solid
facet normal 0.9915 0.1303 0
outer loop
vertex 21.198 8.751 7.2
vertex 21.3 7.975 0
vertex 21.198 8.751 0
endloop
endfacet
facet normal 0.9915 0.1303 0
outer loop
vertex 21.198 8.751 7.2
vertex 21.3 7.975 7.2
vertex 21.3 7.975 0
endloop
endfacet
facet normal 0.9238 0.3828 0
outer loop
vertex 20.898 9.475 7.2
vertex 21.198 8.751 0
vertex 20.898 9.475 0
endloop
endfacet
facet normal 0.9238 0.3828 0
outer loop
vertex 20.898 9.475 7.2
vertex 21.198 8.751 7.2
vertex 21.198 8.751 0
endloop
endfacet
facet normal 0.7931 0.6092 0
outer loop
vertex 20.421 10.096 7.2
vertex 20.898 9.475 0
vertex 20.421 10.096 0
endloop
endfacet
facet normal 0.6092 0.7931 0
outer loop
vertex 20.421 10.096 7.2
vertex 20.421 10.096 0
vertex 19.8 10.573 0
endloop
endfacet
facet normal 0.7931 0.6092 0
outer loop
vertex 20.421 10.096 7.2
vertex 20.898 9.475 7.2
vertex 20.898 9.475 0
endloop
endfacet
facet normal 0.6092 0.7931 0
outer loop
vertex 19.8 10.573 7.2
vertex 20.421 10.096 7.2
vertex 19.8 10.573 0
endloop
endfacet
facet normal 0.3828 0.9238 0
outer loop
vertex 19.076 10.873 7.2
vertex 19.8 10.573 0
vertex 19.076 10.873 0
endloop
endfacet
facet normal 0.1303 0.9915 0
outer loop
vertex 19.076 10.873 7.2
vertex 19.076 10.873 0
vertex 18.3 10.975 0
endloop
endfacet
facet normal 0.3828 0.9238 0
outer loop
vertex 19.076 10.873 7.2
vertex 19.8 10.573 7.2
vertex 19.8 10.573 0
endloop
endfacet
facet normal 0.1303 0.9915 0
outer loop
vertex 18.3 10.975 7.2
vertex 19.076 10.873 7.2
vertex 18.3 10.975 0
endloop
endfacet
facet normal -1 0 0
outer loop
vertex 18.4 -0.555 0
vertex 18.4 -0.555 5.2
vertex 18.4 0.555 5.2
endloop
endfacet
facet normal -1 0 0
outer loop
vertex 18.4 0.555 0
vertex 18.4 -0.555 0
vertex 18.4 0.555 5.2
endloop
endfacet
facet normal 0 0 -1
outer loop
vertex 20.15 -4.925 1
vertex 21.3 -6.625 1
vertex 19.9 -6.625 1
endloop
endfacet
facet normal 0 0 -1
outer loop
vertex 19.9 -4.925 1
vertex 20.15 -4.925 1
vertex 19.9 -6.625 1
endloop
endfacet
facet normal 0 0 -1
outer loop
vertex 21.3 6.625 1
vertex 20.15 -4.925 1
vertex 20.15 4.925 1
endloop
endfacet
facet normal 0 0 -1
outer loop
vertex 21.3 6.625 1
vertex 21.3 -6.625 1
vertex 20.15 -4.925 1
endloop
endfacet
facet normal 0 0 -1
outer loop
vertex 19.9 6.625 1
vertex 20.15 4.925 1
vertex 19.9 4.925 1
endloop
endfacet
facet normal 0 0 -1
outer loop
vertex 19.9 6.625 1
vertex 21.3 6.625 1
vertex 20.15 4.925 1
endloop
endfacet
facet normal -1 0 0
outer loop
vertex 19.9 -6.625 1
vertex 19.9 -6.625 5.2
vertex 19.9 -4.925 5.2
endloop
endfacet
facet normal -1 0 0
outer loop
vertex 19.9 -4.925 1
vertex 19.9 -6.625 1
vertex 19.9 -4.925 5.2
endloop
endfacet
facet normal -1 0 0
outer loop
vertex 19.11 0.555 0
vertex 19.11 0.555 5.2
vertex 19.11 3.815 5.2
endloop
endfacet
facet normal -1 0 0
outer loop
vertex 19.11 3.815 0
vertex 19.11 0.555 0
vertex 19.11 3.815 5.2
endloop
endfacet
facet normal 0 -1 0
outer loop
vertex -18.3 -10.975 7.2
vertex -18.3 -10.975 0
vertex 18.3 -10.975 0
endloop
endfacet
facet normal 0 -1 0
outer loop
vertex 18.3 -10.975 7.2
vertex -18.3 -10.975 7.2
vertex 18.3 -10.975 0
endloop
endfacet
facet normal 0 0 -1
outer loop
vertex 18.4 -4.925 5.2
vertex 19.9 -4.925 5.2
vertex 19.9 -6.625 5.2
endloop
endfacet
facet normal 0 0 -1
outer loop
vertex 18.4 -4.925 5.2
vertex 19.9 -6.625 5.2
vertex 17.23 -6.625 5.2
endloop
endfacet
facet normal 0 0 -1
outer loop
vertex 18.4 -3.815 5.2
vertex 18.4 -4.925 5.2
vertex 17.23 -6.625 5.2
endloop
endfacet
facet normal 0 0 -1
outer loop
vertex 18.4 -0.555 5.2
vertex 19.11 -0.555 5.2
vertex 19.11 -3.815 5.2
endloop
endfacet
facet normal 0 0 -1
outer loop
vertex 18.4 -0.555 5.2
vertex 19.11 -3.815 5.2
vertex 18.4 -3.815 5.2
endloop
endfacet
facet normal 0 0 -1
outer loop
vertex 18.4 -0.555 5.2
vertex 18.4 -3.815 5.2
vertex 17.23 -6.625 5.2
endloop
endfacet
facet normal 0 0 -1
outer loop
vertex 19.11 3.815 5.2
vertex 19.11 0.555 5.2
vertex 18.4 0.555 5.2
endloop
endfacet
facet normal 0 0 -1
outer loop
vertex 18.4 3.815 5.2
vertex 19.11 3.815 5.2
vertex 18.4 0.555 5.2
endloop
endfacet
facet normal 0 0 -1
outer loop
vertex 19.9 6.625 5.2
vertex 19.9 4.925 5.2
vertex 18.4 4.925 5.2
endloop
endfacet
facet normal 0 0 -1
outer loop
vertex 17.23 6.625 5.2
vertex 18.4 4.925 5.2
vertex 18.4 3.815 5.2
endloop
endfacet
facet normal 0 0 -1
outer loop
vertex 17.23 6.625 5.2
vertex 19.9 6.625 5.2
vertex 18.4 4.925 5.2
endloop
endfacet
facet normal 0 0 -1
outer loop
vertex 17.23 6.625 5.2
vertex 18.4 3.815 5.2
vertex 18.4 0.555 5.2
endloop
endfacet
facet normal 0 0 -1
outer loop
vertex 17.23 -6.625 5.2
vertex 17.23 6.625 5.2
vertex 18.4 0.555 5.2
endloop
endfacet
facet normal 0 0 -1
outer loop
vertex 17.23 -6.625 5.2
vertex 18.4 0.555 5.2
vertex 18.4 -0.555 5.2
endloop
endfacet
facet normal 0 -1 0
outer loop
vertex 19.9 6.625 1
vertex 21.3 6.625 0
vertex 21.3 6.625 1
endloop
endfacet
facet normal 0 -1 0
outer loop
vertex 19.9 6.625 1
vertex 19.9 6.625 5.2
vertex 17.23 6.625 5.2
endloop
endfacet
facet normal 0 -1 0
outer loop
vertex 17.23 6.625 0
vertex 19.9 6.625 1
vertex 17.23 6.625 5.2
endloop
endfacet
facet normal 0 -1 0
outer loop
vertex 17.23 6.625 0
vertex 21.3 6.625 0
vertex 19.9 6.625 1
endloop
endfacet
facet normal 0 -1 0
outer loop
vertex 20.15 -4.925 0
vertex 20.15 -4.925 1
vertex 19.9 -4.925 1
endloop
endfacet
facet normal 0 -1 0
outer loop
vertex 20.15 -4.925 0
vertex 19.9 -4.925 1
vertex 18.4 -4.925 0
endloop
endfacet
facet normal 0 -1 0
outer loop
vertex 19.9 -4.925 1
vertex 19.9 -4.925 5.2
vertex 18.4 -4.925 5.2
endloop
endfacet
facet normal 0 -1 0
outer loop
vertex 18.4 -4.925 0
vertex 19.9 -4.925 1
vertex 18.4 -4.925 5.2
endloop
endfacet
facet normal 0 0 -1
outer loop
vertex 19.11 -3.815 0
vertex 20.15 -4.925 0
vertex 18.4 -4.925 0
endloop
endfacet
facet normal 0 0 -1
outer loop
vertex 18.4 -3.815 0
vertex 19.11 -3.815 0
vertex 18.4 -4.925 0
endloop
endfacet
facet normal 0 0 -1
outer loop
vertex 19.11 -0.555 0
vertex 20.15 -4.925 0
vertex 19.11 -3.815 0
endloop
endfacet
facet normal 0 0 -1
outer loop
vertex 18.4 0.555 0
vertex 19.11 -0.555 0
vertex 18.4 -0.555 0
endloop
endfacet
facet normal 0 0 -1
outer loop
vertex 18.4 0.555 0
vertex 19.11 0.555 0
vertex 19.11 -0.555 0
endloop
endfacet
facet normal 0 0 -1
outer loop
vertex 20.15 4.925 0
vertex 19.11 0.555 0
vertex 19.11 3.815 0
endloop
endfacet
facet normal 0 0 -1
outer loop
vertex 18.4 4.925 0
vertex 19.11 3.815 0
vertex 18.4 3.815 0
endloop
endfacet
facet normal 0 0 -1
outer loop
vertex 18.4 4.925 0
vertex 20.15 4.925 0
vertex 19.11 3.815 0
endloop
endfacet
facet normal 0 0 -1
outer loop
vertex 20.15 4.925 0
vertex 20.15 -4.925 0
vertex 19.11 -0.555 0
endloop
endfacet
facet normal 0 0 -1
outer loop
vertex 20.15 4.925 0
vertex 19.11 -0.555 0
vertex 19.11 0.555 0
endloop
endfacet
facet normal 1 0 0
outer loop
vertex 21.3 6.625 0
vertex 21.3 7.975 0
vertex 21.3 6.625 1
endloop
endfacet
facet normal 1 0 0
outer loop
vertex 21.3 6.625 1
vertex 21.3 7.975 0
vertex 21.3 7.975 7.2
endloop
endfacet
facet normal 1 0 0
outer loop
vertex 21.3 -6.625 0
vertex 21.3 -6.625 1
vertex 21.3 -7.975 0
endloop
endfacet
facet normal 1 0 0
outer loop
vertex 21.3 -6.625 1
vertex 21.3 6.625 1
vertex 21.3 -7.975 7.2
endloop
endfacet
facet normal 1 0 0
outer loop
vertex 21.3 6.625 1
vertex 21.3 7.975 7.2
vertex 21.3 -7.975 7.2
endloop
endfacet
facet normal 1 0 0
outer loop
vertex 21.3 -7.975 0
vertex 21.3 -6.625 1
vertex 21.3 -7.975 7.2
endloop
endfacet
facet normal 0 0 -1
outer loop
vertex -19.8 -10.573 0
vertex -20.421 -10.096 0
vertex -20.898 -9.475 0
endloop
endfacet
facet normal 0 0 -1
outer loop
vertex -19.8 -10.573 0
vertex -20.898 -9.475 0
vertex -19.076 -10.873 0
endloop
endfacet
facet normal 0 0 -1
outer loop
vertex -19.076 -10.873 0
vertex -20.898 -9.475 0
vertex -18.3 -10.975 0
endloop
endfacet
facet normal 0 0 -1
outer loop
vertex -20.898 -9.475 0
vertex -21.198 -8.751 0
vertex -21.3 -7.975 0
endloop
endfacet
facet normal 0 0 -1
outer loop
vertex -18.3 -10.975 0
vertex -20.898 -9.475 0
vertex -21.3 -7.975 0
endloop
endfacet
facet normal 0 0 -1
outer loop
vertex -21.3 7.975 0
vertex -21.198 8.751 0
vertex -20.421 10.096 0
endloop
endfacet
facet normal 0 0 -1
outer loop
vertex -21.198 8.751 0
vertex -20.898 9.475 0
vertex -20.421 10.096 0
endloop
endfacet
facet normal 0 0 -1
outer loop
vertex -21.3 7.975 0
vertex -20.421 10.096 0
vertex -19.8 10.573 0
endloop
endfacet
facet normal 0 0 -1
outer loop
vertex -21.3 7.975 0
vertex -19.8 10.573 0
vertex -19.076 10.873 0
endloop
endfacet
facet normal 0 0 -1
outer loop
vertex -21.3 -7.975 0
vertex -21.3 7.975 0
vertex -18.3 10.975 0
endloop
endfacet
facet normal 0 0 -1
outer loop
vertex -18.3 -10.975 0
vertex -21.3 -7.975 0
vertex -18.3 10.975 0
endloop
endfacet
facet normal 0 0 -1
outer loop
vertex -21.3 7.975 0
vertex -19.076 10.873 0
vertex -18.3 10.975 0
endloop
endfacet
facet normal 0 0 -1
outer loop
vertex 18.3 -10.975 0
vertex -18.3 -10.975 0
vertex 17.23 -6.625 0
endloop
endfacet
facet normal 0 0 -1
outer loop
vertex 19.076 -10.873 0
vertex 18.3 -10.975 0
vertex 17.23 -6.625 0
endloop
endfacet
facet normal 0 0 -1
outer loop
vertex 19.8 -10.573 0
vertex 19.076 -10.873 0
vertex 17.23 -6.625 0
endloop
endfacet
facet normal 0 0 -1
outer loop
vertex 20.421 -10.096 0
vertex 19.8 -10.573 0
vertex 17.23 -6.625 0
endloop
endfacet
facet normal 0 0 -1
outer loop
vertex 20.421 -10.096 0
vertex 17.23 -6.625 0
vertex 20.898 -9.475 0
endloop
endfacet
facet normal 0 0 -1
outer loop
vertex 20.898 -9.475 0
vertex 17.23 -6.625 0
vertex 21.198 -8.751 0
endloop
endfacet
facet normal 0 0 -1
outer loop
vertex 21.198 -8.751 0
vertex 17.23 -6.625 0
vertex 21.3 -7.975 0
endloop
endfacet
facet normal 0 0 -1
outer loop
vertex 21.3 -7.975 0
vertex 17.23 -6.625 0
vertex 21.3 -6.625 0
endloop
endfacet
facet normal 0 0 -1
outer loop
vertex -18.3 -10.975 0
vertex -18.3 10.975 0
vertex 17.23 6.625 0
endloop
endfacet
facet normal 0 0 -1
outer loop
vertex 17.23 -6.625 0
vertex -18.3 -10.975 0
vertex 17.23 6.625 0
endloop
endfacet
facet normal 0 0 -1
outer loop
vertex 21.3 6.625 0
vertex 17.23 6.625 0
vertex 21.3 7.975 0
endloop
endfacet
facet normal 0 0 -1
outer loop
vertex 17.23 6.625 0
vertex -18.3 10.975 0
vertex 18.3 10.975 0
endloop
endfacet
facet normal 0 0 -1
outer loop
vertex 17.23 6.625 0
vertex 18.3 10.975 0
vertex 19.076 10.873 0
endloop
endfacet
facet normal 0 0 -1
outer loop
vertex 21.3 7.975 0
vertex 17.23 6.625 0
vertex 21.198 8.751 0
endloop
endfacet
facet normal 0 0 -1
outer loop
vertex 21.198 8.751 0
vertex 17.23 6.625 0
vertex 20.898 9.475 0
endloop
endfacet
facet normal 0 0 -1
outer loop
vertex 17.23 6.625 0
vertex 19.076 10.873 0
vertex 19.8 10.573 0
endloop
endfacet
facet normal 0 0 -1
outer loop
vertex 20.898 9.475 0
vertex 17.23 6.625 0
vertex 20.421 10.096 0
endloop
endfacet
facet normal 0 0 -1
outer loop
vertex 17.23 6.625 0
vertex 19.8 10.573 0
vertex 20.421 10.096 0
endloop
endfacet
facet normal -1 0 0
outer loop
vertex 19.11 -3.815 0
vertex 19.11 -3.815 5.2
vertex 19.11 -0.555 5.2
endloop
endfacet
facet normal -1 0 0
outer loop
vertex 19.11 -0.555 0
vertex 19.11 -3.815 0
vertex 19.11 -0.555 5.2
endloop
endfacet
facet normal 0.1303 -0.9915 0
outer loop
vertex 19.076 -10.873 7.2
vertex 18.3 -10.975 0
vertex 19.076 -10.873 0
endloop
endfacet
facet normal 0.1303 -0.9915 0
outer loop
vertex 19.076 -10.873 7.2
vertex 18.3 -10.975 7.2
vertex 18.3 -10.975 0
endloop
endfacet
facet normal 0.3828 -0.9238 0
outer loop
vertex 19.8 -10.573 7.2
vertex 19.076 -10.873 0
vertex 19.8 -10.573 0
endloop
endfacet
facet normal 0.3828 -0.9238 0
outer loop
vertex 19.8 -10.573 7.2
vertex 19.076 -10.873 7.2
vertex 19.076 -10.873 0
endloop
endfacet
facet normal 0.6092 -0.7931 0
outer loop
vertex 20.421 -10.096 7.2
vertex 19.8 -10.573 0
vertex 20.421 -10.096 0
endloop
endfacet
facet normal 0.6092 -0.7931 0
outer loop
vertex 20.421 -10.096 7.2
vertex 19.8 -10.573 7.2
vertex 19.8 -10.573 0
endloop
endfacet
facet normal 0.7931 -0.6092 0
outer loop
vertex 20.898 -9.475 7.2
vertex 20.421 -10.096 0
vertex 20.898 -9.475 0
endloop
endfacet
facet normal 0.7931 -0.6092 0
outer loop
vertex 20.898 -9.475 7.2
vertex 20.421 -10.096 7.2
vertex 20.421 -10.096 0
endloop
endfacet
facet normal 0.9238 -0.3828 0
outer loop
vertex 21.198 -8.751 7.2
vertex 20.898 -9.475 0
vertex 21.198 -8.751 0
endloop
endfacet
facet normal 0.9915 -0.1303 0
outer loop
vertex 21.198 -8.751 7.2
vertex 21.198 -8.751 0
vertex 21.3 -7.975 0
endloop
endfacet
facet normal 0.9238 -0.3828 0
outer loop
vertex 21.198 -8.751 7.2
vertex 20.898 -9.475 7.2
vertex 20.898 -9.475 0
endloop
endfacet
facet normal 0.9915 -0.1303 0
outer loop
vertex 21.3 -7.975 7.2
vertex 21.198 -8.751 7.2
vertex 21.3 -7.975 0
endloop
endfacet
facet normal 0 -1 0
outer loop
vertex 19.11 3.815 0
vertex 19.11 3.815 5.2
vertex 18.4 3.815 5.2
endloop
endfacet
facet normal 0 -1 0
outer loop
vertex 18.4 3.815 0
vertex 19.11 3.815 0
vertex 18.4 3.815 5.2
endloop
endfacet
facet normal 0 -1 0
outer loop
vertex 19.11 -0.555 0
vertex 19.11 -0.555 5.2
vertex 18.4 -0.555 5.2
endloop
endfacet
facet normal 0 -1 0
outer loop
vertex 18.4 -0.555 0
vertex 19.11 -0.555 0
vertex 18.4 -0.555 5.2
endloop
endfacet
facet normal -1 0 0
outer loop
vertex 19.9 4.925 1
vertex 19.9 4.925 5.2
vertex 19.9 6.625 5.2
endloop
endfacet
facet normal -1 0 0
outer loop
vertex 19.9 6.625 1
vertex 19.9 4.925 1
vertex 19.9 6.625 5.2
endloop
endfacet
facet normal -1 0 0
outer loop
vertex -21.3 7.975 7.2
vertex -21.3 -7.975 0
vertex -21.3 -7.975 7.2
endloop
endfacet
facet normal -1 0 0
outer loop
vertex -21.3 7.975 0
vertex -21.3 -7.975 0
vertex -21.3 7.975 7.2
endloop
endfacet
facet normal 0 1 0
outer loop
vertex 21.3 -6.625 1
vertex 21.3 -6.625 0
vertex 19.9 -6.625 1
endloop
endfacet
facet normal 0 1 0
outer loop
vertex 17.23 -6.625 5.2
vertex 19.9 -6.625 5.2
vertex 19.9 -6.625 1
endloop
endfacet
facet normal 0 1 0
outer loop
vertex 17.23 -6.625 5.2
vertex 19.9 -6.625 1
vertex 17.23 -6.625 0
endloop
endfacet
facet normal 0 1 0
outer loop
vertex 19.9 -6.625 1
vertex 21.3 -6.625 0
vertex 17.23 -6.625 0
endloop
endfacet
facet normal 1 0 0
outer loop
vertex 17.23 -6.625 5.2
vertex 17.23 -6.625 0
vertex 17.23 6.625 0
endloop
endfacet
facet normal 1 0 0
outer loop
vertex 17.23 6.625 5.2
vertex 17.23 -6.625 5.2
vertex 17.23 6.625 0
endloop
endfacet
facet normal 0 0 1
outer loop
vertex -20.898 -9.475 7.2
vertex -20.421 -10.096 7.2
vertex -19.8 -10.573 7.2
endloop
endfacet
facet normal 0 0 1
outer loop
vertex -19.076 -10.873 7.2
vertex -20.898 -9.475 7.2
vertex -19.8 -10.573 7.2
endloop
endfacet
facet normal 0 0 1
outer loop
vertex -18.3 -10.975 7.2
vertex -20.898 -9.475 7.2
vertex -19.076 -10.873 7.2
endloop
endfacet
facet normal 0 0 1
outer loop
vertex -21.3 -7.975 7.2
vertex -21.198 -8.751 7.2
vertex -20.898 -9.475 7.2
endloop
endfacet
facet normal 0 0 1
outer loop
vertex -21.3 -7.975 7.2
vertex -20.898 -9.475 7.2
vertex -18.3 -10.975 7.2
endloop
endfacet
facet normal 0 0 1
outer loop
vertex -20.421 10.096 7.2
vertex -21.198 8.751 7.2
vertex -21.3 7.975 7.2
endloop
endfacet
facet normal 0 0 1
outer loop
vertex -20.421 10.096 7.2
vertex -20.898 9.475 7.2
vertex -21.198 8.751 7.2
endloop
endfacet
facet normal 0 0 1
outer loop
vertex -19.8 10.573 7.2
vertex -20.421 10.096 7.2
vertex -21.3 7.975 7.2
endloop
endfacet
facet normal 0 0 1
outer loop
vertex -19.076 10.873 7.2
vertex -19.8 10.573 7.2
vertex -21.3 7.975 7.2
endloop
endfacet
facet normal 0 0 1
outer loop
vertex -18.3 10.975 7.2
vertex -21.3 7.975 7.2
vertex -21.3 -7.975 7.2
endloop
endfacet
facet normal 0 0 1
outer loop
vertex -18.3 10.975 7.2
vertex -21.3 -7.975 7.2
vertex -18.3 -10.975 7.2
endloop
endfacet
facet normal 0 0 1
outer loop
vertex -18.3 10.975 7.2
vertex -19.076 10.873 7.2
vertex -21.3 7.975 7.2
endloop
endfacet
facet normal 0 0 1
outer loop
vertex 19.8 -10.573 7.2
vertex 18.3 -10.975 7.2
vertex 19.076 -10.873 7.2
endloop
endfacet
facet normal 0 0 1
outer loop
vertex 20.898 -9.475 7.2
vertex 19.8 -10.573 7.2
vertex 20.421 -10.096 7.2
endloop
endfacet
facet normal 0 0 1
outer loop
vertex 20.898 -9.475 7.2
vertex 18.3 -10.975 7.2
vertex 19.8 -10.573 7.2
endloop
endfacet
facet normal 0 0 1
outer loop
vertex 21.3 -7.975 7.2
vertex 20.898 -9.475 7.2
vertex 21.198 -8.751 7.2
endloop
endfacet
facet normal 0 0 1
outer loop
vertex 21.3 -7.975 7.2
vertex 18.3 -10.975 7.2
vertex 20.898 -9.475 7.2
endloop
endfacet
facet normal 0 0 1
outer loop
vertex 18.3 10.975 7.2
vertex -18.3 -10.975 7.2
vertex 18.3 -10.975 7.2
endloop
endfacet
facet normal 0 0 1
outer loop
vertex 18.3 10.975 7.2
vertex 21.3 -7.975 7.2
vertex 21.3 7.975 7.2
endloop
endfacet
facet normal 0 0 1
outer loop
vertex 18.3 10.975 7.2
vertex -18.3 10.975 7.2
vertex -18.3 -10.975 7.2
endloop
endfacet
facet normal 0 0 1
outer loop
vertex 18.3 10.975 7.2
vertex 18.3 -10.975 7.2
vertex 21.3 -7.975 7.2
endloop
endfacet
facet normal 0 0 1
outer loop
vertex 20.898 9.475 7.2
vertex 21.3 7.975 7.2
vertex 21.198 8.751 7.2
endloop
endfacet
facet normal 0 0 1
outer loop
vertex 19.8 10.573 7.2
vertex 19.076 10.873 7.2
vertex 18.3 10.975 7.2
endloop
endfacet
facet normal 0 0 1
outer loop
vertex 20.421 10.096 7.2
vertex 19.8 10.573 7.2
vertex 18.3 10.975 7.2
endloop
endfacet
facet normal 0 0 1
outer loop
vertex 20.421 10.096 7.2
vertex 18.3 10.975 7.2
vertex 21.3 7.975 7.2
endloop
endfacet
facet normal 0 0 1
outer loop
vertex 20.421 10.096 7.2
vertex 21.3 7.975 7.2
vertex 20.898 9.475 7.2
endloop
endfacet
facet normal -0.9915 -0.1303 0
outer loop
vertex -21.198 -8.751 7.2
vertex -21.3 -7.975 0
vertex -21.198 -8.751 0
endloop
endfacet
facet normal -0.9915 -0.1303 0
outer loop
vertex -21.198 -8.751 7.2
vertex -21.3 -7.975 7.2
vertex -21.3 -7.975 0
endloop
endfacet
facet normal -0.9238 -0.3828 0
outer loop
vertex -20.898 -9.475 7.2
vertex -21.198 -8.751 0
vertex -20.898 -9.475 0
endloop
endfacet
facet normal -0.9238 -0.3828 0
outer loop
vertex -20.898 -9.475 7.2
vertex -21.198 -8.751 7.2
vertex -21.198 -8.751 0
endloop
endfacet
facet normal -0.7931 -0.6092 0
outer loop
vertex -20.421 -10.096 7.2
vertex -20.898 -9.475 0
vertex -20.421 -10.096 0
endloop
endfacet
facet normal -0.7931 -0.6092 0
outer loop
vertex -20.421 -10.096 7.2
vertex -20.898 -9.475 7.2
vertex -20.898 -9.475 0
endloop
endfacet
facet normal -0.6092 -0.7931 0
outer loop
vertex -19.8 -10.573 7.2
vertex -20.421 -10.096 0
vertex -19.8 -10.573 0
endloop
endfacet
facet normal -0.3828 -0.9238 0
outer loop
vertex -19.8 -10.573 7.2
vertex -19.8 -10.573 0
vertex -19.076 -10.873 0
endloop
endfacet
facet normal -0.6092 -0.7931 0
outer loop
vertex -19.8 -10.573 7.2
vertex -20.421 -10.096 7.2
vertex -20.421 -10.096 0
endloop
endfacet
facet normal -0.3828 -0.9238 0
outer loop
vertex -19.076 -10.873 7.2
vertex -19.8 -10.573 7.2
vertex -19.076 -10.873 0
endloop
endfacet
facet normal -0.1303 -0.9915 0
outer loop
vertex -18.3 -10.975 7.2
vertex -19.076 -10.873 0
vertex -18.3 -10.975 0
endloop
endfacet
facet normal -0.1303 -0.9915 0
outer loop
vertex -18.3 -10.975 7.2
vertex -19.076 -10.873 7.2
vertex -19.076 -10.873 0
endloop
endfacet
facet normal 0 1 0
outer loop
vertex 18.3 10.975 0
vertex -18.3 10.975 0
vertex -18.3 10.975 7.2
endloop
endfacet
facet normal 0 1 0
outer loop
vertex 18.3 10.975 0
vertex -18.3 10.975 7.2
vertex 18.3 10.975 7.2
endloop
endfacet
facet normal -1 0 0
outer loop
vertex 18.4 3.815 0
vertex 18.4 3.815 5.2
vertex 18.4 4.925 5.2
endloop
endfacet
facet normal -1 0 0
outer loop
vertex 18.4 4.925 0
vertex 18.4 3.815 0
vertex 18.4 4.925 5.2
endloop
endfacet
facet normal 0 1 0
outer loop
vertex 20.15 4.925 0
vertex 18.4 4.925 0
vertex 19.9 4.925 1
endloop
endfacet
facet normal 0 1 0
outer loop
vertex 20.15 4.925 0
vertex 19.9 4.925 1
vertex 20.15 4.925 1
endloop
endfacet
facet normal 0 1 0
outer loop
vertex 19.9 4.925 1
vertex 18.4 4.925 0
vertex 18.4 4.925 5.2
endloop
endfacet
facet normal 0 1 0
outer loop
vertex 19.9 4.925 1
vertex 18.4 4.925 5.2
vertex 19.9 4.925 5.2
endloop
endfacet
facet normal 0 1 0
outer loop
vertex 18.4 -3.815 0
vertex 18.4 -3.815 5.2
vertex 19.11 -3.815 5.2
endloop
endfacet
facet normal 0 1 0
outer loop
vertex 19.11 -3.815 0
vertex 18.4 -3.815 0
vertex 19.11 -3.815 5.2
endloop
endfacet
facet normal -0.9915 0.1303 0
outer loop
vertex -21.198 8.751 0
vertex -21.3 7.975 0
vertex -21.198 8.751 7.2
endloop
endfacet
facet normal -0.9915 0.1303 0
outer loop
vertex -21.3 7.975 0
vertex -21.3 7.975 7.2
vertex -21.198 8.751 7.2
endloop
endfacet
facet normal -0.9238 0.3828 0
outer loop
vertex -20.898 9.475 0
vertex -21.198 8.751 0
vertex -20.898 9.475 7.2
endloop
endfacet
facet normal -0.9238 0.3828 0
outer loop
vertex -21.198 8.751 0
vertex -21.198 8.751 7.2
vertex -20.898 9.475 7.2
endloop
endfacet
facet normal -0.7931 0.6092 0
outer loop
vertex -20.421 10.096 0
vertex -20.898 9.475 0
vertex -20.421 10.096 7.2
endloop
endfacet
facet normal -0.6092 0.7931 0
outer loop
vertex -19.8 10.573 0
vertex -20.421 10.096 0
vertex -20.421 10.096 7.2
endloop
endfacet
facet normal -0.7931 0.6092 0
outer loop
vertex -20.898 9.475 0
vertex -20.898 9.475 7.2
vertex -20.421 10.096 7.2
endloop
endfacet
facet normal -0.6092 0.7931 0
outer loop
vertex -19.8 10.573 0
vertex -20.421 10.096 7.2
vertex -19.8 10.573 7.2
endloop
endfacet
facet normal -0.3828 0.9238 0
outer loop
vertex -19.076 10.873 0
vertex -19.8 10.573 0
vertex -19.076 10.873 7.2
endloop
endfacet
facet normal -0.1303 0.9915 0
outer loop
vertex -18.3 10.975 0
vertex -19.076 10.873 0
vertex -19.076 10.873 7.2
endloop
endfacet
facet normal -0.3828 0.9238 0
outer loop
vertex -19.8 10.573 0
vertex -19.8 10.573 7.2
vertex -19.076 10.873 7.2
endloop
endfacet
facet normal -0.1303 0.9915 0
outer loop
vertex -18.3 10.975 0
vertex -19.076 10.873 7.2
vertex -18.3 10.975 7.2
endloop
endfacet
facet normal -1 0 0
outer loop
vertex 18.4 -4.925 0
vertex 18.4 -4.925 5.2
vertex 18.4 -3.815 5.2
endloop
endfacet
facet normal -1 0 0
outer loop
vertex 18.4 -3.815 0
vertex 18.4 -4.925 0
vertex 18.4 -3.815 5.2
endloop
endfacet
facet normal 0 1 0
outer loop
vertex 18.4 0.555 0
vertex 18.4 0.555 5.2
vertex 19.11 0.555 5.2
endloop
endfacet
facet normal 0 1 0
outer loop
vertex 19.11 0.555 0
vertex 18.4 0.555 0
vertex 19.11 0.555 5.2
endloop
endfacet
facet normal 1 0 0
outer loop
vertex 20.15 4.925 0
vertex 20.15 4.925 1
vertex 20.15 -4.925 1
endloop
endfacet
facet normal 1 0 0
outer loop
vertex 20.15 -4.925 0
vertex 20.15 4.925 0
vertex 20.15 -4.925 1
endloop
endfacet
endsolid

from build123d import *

# Parameters (mm, degrees)
SKETCH2_W           = 42.6
SKETCH2_H           = 21.95
BOSS_EXTRUDE1_DEPTH = 7.2
FILLET1_R           = 3
SKETCH3_W           = 4.07
SKETCH3_H           = 13.25
CUT_EXTRUDE1_DEPTH  = 5.2
BOSS_EXTRUDE2_DEPTH = 5.2
BOSS_EXTRUDE3_DEPTH = 4.2


with BuildPart() as part:
    # Sketch2 → Boss-Extrude1 (new body)
    with BuildSketch(Plane.XY):
        Rectangle(SKETCH2_W, SKETCH2_H)
    extrude(amount=BOSS_EXTRUDE1_DEPTH)

    # Fillet1
    fillet1_edges = [part.edges().sort_by_distance(p)[0] for p in [
        (-21.3, 10.975, 3.6),
        (21.3, 10.975, 3.6),
        (21.3, -10.975, 3.6),
        (-21.3, -10.975, 3.6),
    ]]
    fillet(fillet1_edges, radius=FILLET1_R)

    # Sketch3 → Cut-Extrude1 (cut)
    with BuildSketch(Plane(origin=(0, 0, 0), x_dir=(-1, 0, 0), z_dir=(0, 0, -1))):
        with Locations((-19.265, 0)):
            Rectangle(SKETCH3_W, SKETCH3_H)
    extrude(amount=-CUT_EXTRUDE1_DEPTH, mode=Mode.SUBTRACT)

    # Sketch4 → Boss-Extrude2 (add)
    with BuildSketch(Plane(origin=(0, 0, 5.2), x_dir=(-1, 0, 0), z_dir=(0, 0, -1))):
        Polygon((-20.15, 4.925), (-20.15, -4.925), (-18.4, -4.925), (-18.4, -3.815), (-19.11, -3.815), (-19.11, -0.555), (-18.4, -0.555), (-18.4, 0.555), (-19.11, 0.555), (-19.11, 3.815), (-18.4, 3.815), (-18.4, 4.925), align=None)
    extrude(amount=BOSS_EXTRUDE2_DEPTH)

    # Sketch5 → Boss-Extrude3 (add)
    with BuildSketch(Plane(origin=(0, 0, 5.2), x_dir=(-1, 0, 0), z_dir=(0, 0, -1))):
        Polygon((-21.3, 6.625), (-21.3, -6.625), (-19.9, -6.625), (-19.9, -4.925), (-20.15, -4.925), (-20.15, 4.925), (-19.9, 4.925), (-19.9, 6.625), align=None)
    extrude(amount=BOSS_EXTRUDE3_DEPTH)


solid = part.part
